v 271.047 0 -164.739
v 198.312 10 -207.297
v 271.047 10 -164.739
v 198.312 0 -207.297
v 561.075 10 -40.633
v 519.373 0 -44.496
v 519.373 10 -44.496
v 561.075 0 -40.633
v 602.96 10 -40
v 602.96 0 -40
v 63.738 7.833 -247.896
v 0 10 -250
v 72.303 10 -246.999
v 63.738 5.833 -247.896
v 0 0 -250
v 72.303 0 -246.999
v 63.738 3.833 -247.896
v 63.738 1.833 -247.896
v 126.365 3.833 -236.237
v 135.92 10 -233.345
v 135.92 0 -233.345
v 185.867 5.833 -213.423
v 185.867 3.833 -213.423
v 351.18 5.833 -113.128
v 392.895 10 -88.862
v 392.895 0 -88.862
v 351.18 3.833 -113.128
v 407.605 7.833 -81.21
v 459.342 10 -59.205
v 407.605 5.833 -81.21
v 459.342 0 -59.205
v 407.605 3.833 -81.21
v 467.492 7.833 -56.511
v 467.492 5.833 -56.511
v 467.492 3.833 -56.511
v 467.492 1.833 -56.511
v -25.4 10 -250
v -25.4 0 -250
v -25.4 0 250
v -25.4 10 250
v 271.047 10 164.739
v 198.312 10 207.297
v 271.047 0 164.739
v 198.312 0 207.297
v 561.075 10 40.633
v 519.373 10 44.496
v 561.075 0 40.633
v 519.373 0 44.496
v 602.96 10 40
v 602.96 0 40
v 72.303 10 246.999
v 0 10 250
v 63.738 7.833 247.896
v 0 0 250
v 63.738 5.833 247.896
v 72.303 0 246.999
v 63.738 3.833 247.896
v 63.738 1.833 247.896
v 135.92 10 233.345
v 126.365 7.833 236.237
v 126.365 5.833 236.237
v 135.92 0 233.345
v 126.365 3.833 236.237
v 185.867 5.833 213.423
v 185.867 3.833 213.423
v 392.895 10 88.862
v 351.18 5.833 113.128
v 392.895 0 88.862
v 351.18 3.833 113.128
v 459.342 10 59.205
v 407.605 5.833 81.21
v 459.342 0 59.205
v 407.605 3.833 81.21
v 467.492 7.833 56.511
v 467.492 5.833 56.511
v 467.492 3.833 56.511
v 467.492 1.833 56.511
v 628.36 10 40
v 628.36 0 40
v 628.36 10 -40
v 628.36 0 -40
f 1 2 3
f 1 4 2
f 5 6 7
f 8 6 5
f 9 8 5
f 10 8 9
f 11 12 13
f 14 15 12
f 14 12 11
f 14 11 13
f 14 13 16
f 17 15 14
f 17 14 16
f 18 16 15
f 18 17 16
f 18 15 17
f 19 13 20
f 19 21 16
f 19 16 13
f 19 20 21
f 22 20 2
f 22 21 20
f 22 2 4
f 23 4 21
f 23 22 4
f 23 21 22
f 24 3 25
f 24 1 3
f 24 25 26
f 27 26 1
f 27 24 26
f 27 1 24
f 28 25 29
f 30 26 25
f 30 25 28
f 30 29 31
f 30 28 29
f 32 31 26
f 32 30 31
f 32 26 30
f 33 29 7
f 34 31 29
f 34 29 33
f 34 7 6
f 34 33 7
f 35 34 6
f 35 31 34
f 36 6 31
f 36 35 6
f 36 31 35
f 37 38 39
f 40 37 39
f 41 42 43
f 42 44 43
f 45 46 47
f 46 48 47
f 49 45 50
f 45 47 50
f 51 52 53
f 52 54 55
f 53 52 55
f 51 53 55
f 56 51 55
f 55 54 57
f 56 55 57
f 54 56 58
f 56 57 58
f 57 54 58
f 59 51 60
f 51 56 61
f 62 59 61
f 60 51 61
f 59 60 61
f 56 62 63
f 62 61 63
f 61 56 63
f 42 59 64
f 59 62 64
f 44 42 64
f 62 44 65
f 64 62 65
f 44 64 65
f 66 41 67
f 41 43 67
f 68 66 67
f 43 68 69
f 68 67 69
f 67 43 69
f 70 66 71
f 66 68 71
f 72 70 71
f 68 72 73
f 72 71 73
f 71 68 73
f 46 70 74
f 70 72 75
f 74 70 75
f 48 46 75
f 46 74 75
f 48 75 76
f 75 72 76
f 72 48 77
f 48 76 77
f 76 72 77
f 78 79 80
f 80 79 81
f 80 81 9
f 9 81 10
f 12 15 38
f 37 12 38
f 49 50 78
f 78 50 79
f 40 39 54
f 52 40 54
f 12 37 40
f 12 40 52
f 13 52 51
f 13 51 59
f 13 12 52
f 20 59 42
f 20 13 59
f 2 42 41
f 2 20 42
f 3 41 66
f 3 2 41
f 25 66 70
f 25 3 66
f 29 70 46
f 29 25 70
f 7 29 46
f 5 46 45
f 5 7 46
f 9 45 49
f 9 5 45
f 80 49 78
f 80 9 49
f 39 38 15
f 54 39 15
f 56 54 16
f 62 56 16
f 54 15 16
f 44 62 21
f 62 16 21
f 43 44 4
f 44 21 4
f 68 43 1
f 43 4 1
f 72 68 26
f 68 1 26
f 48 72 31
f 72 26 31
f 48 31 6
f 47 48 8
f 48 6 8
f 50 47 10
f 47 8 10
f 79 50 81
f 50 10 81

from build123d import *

# Parameters (mm, degrees)
BOSS_EXTRUDE1_DEPTH = 10


with BuildPart() as part:
    # Sketch2 → Boss-Extrude1 (new body)
    with BuildSketch(Plane(origin=(0, 0, 0), x_dir=(1, 0, 0), z_dir=(0, 1, 0))):
        with BuildLine():
            Line((602.960000001, -40), (628.360000001, -40))
            Line((628.360000001, -40), (628.360000001, 40))
            Line((628.360000001, 40), (602.960000001, 40))
            add(Edge.make_bspline(
                [(0, 250), (1.131031236, 250), (3.358770292, 250.000000003), (8.796297806, 249.997784221), (12.313824052, 249.983976491), (16.948827051, 249.959167009), (20.677742413, 249.92117332), (24.867135006, 249.868183184), (29.453823448, 249.780646369), (34.872840698, 249.638764529), (40.33505504, 249.444262899), (45.967271128, 249.187011571), (53.177523523, 248.77155286), (61.98878186, 248.108986796), (72.240608905, 247.08571443), (83.917829127, 245.539765846), (95.533244533, 243.595057869), (107.073902326, 241.240157871), (118.522065352, 238.473331116), (132.700805727, 234.508961084), (146.684800287, 229.893458887), (160.454632321, 224.677267983), (174.044662558, 218.910987655), (184.831827692, 213.982198347), (195.491796688, 208.784697651), (206.031078869, 203.347077443), (216.421911741, 197.717889727), (226.674958166, 191.925628535), (239.377568262, 184.487962432), (254.460973864, 175.294585429), (271.876468287, 164.276962988), (291.628985453, 151.451312882), (311.331014557, 138.548686677), (331.083531617, 125.723038473), (350.986954957, 113.131465206), (371.139716909, 100.940384071), (389.10946348, 90.761663453), (404.821831782, 82.50560077), (418.128182226, 76.017787755), (428.915328943, 71.089037301), (439.795009545, 66.472707342), (450.767282366, 62.19306212), (461.868765882, 58.260289969), (473.095033587, 54.698205156), (484.437746208, 51.526641761), (495.886441901, 48.75985944), (505.983655162, 46.699297059), (514.687032, 45.189499616), (521.964646592, 44.098671482), (527.803696286, 43.324303169), (533.648357788, 42.645452029), (539.514027562, 42.058648284), (545.369191286, 41.559731198), (551.261066711, 41.143844609), (558.313030396, 40.735935788), (565.335468194, 40.442966308), (572.056741451, 40.244363645), (578.932534832, 40.119311859), (583.985524287, 40.054535351), (589.91945744, 40.017995984), (594.28348806, 40.002215768), (599.589193263, 40.000000038), (601.828968765, 40), (602.960000001, 40)],
                knots=[0.078174199, 0.078174199, 0.078174199, 0.078174199, 0.078174199, 0.085116359, 0.092058519, 0.099000679, 0.102471759, 0.105942839, 0.112885, 0.11982716, 0.12676932, 0.13371148, 0.141333544, 0.148955608, 0.164199735, 0.179443845, 0.194687956, 0.20993208, 0.225176204, 0.240420329, 0.255664454, 0.286152645, 0.301396827, 0.316641009, 0.332099848, 0.347558687, 0.36280282, 0.378046954, 0.393291087, 0.40853522, 0.439023475, 0.469511731, 0.5, 0.530488269, 0.560976525, 0.59146478, 0.621953046, 0.652441313, 0.667900152, 0.683358991, 0.698603173, 0.713847355, 0.72909145, 0.744335546, 0.759579671, 0.774823796, 0.79006792, 0.805312044, 0.812934099, 0.820556155, 0.82817821, 0.835800265, 0.843422329, 0.851044392, 0.858666456, 0.86628852, 0.88017284, 0.887115, 0.894057161, 0.900999321, 0.907941481, 0.914883641, 0.921825801, 0.921825801, 0.921825801, 0.921825801, 0.921825801], degree=4))
            Line((0, 250), (-25.4, 250))
            Line((-25.4, 250), (-25.4, -250))
            Line((-25.4, -250), (0, -250))
            add(Edge.make_bspline(
                [(0, -250), (1.131031236, -250), (3.358770292, -250.000000003), (8.796297806, -249.997784221), (12.313824052, -249.983976491), (16.948827051, -249.959167009), (20.677742413, -249.92117332), (24.867135006, -249.868183184), (29.453823448, -249.780646369), (34.872840698, -249.638764529), (40.33505504, -249.444262899), (45.967271128, -249.187011571), (53.177523523, -248.77155286), (61.98878186, -248.108986796), (72.240608905, -247.08571443), (83.917829127, -245.539765846), (95.533244533, -243.595057869), (107.073902326, -241.240157871), (118.522065351, -238.473331116), (132.700805727, -234.508961084), (146.684800287, -229.893458887), (160.454632321, -224.677267983), (174.044662558, -218.910987655), (184.831827692, -213.982198347), (195.491796688, -208.784697651), (206.031078869, -203.347077443), (216.421911741, -197.717889727), (226.674958166, -191.925628535), (239.377568262, -184.487962432), (254.460973864, -175.294585429), (271.876468287, -164.276962988), (291.628985453, -151.451312882), (311.331014556, -138.548686677), (331.083531617, -125.723038473), (350.986954957, -113.131465206), (371.139716909, -100.940384071), (389.10946348, -90.761663453), (404.821831782, -82.505600769), (418.128182226, -76.017787755), (428.915328943, -71.089037301), (439.795009544, -66.472707341), (450.767282366, -62.19306212), (461.868765882, -58.260289969), (473.095033586, -54.698205156), (484.437746208, -51.526641761), (495.886441901, -48.75985944), (505.983655162, -46.699297059), (514.687032, -45.189499616), (521.964646592, -44.098671482), (527.803696286, -43.324303169), (533.648357788, -42.645452029), (539.514027562, -42.058648284), (545.369191286, -41.559731198), (551.261066711, -41.143844609), (558.313030396, -40.735935788), (565.335468194, -40.442966308), (572.056741451, -40.244363645), (578.932534832, -40.119311858), (583.985524287, -40.054535351), (589.91945744, -40.017995984), (594.28348806, -40.002215768), (599.589193263, -40.000000038), (601.828968765, -40), (602.960000001, -40)],
                knots=[0.078174199, 0.078174199, 0.078174199, 0.078174199, 0.078174199, 0.085116359, 0.092058519, 0.099000679, 0.102471759, 0.105942839, 0.112885, 0.11982716, 0.12676932, 0.13371148, 0.141333544, 0.148955608, 0.164199735, 0.179443845, 0.194687956, 0.20993208, 0.225176204, 0.240420329, 0.255664454, 0.286152645, 0.301396827, 0.316641009, 0.332099848, 0.347558687, 0.36280282, 0.378046954, 0.393291087, 0.40853522, 0.439023475, 0.469511731, 0.5, 0.530488269, 0.560976525, 0.59146478, 0.621953046, 0.652441313, 0.667900152, 0.683358991, 0.698603173, 0.713847355, 0.72909145, 0.744335546, 0.759579671, 0.774823796, 0.79006792, 0.805312044, 0.812934099, 0.820556155, 0.82817821, 0.835800265, 0.843422329, 0.851044392, 0.858666456, 0.86628852, 0.88017284, 0.887115, 0.894057161, 0.900999321, 0.907941481, 0.914883641, 0.921825801, 0.921825801, 0.921825801, 0.921825801, 0.921825801], degree=4))
        make_face()
    extrude(amount=BOSS_EXTRUDE1_DEPTH)


solid = part.part
